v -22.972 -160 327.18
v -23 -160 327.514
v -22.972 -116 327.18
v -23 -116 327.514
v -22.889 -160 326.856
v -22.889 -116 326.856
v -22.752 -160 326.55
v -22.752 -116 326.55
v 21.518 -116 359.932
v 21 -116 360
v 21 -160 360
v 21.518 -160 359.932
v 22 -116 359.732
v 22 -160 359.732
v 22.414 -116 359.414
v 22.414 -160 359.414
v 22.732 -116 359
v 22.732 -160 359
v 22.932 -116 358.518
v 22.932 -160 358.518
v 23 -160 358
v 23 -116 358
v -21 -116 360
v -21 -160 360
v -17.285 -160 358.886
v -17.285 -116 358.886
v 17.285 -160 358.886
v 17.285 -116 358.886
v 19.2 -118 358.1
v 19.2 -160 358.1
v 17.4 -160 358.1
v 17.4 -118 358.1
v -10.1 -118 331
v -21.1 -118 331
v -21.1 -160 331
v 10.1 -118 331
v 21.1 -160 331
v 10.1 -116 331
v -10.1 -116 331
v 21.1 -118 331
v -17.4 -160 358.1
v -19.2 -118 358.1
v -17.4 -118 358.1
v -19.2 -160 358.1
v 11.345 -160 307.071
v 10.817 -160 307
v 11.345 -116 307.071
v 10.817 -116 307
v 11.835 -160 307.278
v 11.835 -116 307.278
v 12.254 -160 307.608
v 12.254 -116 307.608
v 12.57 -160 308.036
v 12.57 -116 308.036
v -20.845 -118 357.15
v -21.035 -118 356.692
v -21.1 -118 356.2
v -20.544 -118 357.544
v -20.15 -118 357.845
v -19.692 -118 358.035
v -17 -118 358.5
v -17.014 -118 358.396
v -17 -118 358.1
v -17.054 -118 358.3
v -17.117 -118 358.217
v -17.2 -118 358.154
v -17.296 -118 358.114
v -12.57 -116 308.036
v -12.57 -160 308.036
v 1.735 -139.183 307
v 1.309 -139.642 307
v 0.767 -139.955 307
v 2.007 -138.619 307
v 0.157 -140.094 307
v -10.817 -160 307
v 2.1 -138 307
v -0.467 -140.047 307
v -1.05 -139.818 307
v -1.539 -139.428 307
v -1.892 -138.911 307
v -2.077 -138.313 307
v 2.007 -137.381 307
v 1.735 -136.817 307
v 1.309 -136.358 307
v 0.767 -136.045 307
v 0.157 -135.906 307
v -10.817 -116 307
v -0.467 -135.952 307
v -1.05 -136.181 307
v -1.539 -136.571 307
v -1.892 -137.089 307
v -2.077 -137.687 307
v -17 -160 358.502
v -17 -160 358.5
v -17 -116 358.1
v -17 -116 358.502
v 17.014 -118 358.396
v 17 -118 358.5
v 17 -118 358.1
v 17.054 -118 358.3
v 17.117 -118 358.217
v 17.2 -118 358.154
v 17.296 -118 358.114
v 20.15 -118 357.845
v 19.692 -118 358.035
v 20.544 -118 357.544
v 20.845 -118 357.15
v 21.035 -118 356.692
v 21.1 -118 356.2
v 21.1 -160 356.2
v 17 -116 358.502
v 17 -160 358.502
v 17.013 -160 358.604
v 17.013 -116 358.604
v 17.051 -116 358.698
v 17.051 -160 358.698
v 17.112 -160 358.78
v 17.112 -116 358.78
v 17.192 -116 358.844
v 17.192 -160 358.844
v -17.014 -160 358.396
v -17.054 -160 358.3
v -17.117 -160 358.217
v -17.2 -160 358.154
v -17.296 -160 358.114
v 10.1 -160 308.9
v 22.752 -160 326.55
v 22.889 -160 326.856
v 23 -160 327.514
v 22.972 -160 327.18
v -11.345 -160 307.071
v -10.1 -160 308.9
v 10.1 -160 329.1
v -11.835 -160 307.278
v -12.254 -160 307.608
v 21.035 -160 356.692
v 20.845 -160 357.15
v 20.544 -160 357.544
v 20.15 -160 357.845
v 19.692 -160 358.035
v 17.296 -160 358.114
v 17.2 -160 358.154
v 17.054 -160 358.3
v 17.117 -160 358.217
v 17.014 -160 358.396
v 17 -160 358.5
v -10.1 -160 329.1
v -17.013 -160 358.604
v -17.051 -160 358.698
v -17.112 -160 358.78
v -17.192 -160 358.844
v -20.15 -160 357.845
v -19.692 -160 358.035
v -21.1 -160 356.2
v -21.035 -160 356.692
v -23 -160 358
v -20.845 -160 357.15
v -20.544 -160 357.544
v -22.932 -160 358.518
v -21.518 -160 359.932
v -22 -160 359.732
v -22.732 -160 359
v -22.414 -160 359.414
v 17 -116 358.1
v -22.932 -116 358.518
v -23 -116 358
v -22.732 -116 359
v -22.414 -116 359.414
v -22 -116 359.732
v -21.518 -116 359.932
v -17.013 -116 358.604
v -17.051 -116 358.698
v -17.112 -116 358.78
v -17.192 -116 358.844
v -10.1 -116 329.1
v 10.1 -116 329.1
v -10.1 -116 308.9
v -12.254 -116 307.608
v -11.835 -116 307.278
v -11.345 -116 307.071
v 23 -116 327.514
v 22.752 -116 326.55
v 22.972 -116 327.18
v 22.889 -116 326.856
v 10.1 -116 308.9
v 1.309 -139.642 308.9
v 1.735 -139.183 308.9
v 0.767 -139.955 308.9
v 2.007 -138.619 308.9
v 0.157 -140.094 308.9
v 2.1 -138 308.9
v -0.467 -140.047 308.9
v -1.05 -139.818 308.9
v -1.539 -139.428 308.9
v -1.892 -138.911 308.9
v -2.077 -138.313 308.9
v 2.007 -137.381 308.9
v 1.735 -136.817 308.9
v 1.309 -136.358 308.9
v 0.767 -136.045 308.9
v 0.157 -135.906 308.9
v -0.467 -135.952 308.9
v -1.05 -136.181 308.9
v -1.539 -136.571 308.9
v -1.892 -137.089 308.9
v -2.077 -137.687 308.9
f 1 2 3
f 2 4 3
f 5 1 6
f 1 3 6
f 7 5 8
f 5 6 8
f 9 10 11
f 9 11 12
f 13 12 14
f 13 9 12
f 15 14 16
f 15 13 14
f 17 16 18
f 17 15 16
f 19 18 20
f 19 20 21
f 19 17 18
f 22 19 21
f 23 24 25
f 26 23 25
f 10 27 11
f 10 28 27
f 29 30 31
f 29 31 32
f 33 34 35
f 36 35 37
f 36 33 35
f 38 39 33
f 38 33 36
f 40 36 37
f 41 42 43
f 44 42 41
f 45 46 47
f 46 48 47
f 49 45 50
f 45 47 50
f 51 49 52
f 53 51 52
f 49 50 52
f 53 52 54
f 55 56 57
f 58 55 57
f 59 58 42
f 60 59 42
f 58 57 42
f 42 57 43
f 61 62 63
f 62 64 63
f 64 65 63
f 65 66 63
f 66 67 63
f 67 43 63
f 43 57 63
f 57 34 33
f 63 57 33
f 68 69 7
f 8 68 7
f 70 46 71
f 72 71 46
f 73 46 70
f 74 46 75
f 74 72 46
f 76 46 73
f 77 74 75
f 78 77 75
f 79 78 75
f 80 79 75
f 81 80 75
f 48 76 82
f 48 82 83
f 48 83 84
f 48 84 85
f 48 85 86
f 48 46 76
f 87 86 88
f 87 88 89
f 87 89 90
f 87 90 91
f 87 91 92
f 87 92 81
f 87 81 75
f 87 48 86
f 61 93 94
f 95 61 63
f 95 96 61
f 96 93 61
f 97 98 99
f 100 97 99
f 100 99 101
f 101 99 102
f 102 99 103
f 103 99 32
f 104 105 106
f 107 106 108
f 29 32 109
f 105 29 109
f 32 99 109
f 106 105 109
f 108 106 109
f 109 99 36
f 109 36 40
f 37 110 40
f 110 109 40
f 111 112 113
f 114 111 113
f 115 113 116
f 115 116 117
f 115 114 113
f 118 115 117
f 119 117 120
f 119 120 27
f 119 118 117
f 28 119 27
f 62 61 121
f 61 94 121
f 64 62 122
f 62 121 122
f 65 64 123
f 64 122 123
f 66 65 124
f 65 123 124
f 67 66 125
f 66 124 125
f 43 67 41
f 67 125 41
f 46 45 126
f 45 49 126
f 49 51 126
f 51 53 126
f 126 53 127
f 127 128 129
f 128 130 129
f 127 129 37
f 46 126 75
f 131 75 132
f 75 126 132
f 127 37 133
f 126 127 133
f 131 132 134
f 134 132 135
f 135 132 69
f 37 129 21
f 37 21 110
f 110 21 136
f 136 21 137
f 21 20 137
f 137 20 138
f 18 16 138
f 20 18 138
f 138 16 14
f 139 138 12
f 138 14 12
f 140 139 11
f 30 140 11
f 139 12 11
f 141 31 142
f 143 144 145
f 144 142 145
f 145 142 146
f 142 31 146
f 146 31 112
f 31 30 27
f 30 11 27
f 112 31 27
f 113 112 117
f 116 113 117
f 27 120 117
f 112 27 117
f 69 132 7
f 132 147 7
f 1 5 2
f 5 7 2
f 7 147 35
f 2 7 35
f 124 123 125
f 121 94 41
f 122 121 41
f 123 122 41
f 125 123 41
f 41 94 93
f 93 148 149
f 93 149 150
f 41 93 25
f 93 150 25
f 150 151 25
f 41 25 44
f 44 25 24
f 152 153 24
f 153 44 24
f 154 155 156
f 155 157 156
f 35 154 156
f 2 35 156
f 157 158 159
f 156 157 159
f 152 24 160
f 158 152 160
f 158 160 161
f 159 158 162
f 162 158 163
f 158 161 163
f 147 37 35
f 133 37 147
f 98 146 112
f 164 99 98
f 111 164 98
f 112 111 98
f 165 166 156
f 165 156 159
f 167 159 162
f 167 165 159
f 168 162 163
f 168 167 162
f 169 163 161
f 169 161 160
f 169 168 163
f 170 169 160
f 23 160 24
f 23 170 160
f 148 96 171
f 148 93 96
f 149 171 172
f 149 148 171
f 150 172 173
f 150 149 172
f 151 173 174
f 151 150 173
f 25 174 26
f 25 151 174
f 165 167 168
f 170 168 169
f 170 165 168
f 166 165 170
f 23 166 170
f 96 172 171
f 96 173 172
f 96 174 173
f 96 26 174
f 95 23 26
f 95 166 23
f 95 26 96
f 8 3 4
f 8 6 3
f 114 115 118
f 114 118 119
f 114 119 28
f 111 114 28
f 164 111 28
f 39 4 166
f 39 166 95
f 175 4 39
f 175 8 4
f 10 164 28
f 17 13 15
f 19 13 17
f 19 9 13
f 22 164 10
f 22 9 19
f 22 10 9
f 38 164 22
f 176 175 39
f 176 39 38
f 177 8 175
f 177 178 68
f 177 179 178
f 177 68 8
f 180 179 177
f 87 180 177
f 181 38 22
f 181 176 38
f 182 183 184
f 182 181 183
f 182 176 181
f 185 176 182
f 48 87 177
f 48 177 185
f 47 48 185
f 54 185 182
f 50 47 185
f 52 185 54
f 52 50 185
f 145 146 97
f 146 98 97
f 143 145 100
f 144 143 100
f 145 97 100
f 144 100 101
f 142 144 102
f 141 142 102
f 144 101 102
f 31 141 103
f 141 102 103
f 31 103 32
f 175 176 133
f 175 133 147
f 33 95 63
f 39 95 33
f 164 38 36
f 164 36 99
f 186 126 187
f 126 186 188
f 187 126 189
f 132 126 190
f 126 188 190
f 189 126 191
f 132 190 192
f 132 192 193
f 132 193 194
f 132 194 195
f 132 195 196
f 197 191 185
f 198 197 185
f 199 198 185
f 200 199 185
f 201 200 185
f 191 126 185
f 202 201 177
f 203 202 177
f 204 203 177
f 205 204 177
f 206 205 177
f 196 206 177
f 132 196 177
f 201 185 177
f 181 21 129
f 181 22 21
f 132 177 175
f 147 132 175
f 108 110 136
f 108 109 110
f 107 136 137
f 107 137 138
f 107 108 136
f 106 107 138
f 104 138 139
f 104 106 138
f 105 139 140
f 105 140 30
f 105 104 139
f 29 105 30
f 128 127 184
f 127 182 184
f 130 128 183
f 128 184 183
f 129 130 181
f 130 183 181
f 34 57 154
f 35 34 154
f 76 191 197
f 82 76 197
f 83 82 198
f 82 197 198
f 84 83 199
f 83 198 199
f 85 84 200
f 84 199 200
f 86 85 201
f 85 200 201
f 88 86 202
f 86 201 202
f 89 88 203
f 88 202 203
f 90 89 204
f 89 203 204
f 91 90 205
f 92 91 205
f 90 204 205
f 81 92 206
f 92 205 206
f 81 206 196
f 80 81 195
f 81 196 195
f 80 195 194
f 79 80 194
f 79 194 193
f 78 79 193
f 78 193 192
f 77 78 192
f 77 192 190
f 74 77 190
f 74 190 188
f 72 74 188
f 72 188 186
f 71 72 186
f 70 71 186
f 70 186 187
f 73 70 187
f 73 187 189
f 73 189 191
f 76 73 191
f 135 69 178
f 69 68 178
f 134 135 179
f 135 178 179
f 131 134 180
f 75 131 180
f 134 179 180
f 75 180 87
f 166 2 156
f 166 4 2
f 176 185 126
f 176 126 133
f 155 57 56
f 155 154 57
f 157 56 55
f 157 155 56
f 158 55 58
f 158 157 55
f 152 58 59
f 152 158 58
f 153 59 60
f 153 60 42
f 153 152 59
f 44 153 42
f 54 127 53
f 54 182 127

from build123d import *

# Parameters (mm, degrees)
SALIENTE_EXTRUIR1_DEPTH             = 2
SALIENTE_EXTRUIR2_DEPTH             = 42
CORTAR_EXTRUIR1_REACH               = 46.1
CROQUIS3_W                          = 42
CROQUIS3_H                          = 27.1
CORTAR_EXTRUIR2_REACH               = 46.1
CROQUIS4_W                          = 27.1
CROQUIS4_H                          = 42
CROQUIS5_W                          = 20.2
CROQUIS5_H                          = 20.2
CORTAR_EXTRUIR3_DEPTH               = 45
DI_METRO_DE_TALADRO_4_2_4_2_1_D     = 4.2
DI_METRO_DE_TALADRO_4_2_4_2_1_DEPTH = 1.9
REDONDEO1_R                         = 0.4
REDONDEO2_R                         = 1.9
REDONDEO3_R                         = 2


with BuildPart() as part:
    # Croquis1 → Saliente-Extruir1 (new body)
    with BuildSketch(Plane(origin=(0, -115.999797701, 0), x_dir=(1, 0, 0), z_dir=(0, 1, 0))):
        with BuildLine():
            Line((10.1, -331), (17, -358.1))
            Line((17, -358.1), (17, -358.8))
            Line((17, -358.8), (21, -360))
            ThreePointArc((21, -360), (22.414213562, -359.414213562), (23, -358))
            Line((23, -358), (23, -327))
            Line((23, -327), (12, -307))
            Line((12, -307), (-12, -307))
            Line((-12, -307), (-23, -327))
            Line((-23, -327), (-23, -358))
            ThreePointArc((-23, -358), (-22.414213562, -359.414213562), (-21, -360))
            Line((-21, -360), (-17, -358.8))
            Line((-17, -358.8), (-17, -358.1))
            Line((-17, -358.1), (-10.1, -331))
            Line((-10.1, -331), (10.1, -331))
        make_face()
    extrude(amount=-SALIENTE_EXTRUIR1_DEPTH)

    # Croquis2 → Saliente-Extruir2 (add)
    with BuildSketch(Plane.XZ.offset(117.999797701)):
        with BuildLine():
            Line((-17, 331), (17, 331))
            Line((17, 331), (17, 358.8))
            Line((17, 358.8), (21, 360))
            ThreePointArc((21, 360), (22.414213562, 359.414213562), (23, 358))
            Line((23, 358), (23, 327))
            Line((23, 327), (12, 307))
            Line((12, 307), (-12, 307))
            Line((-12, 307), (-23, 327))
            Line((-23, 327), (-23, 358))
            ThreePointArc((-23, 358), (-22.414213562, 359.414213562), (-21, 360))
            Line((-21, 360), (-17, 358.8))
            Line((-17, 358.8), (-17, 331))
        make_face()
    extrude(amount=SALIENTE_EXTRUIR2_DEPTH)

    # Croquis3 → Cortar-Extruir1 (cut, up to next)
    with BuildSketch(Plane(origin=(-21.1, 0, 0), x_dir=(0, -1, 0), z_dir=(-1, 0, 0)), mode=Mode.PRIVATE) as cortar_extruir1_sk1:
        with Locations((138.999797701, 344.55)):
            Rectangle(CROQUIS3_W, CROQUIS3_H)
    cortar_extruir1_tool1 = extrude(cortar_extruir1_sk1.sketch, amount=-CORTAR_EXTRUIR1_REACH, mode=Mode.PRIVATE) & part.part
    add(cortar_extruir1_tool1.solids().sort_by_distance((-21.1, -138.999798, 344.55))[0], mode=Mode.SUBTRACT)

    # Croquis4 → Cortar-Extruir2 (cut, up to next)
    with BuildSketch(Plane(origin=(21.1, 0, 0), x_dir=(0, 0, -1), z_dir=(1, 0, 0)), mode=Mode.PRIVATE) as cortar_extruir2_sk1:
        with Locations((-344.55, -138.999797701)):
            Rectangle(CROQUIS4_W, CROQUIS4_H)
    cortar_extruir2_tool1 = extrude(cortar_extruir2_sk1.sketch, amount=-CORTAR_EXTRUIR2_REACH, mode=Mode.PRIVATE) & part.part
    add(cortar_extruir2_tool1.solids().sort_by_distance((21.1, -138.999798, 344.55))[0], mode=Mode.SUBTRACT)

    # Croquis5 → Cortar-Extruir3 (cut, through all)
    with BuildSketch(Plane(origin=(0, -115.999797701, 0), x_dir=(-1, 0, 0), z_dir=(0, 1, 0))):
        with Locations((0, 319)):
            Rectangle(CROQUIS5_W, CROQUIS5_H)
    extrude(amount=-CORTAR_EXTRUIR3_DEPTH, mode=Mode.SUBTRACT)

    # Diámetro de taladro Ø4.2 (4.2)1
    with Locations(Plane(origin=(0, 0, 307), x_dir=(-1, 0, 0), z_dir=(0, 0, -1))):
        with Locations((0, -137.999797701)):
            Hole(DI_METRO_DE_TALADRO_4_2_4_2_1_D / 2, depth=DI_METRO_DE_TALADRO_4_2_4_2_1_DEPTH)

    # Redondeo1
    redondeo1_edges = [part.edges().sort_by_distance(p)[0] for p in [
        (-17, -137.999797701, 358.8),
        (17, -137.999797701, 358.8),
        (-17, -138.999797701, 358.1),
        (17, -138.999797701, 358.1),
    ]]
    fillet(redondeo1_edges, radius=REDONDEO1_R)

    # Redondeo2
    redondeo2_edges = [part.edges().sort_by_distance(p)[0] for p in [
        (-21.1, -138.999797701, 358.1),
        (21.1, -138.999797701, 358.1),
    ]]
    fillet(redondeo2_edges, radius=REDONDEO2_R)

    # Redondeo3
    redondeo3_edges = [part.edges().sort_by_distance(p)[0] for p in [
        (-23, -137.999797701, 327),
        (-12, -137.999797701, 307),
        (12, -137.999797701, 307),
        (23, -137.999797701, 327),
    ]]
    fillet(redondeo3_edges, radius=REDONDEO3_R)


solid = part.part
